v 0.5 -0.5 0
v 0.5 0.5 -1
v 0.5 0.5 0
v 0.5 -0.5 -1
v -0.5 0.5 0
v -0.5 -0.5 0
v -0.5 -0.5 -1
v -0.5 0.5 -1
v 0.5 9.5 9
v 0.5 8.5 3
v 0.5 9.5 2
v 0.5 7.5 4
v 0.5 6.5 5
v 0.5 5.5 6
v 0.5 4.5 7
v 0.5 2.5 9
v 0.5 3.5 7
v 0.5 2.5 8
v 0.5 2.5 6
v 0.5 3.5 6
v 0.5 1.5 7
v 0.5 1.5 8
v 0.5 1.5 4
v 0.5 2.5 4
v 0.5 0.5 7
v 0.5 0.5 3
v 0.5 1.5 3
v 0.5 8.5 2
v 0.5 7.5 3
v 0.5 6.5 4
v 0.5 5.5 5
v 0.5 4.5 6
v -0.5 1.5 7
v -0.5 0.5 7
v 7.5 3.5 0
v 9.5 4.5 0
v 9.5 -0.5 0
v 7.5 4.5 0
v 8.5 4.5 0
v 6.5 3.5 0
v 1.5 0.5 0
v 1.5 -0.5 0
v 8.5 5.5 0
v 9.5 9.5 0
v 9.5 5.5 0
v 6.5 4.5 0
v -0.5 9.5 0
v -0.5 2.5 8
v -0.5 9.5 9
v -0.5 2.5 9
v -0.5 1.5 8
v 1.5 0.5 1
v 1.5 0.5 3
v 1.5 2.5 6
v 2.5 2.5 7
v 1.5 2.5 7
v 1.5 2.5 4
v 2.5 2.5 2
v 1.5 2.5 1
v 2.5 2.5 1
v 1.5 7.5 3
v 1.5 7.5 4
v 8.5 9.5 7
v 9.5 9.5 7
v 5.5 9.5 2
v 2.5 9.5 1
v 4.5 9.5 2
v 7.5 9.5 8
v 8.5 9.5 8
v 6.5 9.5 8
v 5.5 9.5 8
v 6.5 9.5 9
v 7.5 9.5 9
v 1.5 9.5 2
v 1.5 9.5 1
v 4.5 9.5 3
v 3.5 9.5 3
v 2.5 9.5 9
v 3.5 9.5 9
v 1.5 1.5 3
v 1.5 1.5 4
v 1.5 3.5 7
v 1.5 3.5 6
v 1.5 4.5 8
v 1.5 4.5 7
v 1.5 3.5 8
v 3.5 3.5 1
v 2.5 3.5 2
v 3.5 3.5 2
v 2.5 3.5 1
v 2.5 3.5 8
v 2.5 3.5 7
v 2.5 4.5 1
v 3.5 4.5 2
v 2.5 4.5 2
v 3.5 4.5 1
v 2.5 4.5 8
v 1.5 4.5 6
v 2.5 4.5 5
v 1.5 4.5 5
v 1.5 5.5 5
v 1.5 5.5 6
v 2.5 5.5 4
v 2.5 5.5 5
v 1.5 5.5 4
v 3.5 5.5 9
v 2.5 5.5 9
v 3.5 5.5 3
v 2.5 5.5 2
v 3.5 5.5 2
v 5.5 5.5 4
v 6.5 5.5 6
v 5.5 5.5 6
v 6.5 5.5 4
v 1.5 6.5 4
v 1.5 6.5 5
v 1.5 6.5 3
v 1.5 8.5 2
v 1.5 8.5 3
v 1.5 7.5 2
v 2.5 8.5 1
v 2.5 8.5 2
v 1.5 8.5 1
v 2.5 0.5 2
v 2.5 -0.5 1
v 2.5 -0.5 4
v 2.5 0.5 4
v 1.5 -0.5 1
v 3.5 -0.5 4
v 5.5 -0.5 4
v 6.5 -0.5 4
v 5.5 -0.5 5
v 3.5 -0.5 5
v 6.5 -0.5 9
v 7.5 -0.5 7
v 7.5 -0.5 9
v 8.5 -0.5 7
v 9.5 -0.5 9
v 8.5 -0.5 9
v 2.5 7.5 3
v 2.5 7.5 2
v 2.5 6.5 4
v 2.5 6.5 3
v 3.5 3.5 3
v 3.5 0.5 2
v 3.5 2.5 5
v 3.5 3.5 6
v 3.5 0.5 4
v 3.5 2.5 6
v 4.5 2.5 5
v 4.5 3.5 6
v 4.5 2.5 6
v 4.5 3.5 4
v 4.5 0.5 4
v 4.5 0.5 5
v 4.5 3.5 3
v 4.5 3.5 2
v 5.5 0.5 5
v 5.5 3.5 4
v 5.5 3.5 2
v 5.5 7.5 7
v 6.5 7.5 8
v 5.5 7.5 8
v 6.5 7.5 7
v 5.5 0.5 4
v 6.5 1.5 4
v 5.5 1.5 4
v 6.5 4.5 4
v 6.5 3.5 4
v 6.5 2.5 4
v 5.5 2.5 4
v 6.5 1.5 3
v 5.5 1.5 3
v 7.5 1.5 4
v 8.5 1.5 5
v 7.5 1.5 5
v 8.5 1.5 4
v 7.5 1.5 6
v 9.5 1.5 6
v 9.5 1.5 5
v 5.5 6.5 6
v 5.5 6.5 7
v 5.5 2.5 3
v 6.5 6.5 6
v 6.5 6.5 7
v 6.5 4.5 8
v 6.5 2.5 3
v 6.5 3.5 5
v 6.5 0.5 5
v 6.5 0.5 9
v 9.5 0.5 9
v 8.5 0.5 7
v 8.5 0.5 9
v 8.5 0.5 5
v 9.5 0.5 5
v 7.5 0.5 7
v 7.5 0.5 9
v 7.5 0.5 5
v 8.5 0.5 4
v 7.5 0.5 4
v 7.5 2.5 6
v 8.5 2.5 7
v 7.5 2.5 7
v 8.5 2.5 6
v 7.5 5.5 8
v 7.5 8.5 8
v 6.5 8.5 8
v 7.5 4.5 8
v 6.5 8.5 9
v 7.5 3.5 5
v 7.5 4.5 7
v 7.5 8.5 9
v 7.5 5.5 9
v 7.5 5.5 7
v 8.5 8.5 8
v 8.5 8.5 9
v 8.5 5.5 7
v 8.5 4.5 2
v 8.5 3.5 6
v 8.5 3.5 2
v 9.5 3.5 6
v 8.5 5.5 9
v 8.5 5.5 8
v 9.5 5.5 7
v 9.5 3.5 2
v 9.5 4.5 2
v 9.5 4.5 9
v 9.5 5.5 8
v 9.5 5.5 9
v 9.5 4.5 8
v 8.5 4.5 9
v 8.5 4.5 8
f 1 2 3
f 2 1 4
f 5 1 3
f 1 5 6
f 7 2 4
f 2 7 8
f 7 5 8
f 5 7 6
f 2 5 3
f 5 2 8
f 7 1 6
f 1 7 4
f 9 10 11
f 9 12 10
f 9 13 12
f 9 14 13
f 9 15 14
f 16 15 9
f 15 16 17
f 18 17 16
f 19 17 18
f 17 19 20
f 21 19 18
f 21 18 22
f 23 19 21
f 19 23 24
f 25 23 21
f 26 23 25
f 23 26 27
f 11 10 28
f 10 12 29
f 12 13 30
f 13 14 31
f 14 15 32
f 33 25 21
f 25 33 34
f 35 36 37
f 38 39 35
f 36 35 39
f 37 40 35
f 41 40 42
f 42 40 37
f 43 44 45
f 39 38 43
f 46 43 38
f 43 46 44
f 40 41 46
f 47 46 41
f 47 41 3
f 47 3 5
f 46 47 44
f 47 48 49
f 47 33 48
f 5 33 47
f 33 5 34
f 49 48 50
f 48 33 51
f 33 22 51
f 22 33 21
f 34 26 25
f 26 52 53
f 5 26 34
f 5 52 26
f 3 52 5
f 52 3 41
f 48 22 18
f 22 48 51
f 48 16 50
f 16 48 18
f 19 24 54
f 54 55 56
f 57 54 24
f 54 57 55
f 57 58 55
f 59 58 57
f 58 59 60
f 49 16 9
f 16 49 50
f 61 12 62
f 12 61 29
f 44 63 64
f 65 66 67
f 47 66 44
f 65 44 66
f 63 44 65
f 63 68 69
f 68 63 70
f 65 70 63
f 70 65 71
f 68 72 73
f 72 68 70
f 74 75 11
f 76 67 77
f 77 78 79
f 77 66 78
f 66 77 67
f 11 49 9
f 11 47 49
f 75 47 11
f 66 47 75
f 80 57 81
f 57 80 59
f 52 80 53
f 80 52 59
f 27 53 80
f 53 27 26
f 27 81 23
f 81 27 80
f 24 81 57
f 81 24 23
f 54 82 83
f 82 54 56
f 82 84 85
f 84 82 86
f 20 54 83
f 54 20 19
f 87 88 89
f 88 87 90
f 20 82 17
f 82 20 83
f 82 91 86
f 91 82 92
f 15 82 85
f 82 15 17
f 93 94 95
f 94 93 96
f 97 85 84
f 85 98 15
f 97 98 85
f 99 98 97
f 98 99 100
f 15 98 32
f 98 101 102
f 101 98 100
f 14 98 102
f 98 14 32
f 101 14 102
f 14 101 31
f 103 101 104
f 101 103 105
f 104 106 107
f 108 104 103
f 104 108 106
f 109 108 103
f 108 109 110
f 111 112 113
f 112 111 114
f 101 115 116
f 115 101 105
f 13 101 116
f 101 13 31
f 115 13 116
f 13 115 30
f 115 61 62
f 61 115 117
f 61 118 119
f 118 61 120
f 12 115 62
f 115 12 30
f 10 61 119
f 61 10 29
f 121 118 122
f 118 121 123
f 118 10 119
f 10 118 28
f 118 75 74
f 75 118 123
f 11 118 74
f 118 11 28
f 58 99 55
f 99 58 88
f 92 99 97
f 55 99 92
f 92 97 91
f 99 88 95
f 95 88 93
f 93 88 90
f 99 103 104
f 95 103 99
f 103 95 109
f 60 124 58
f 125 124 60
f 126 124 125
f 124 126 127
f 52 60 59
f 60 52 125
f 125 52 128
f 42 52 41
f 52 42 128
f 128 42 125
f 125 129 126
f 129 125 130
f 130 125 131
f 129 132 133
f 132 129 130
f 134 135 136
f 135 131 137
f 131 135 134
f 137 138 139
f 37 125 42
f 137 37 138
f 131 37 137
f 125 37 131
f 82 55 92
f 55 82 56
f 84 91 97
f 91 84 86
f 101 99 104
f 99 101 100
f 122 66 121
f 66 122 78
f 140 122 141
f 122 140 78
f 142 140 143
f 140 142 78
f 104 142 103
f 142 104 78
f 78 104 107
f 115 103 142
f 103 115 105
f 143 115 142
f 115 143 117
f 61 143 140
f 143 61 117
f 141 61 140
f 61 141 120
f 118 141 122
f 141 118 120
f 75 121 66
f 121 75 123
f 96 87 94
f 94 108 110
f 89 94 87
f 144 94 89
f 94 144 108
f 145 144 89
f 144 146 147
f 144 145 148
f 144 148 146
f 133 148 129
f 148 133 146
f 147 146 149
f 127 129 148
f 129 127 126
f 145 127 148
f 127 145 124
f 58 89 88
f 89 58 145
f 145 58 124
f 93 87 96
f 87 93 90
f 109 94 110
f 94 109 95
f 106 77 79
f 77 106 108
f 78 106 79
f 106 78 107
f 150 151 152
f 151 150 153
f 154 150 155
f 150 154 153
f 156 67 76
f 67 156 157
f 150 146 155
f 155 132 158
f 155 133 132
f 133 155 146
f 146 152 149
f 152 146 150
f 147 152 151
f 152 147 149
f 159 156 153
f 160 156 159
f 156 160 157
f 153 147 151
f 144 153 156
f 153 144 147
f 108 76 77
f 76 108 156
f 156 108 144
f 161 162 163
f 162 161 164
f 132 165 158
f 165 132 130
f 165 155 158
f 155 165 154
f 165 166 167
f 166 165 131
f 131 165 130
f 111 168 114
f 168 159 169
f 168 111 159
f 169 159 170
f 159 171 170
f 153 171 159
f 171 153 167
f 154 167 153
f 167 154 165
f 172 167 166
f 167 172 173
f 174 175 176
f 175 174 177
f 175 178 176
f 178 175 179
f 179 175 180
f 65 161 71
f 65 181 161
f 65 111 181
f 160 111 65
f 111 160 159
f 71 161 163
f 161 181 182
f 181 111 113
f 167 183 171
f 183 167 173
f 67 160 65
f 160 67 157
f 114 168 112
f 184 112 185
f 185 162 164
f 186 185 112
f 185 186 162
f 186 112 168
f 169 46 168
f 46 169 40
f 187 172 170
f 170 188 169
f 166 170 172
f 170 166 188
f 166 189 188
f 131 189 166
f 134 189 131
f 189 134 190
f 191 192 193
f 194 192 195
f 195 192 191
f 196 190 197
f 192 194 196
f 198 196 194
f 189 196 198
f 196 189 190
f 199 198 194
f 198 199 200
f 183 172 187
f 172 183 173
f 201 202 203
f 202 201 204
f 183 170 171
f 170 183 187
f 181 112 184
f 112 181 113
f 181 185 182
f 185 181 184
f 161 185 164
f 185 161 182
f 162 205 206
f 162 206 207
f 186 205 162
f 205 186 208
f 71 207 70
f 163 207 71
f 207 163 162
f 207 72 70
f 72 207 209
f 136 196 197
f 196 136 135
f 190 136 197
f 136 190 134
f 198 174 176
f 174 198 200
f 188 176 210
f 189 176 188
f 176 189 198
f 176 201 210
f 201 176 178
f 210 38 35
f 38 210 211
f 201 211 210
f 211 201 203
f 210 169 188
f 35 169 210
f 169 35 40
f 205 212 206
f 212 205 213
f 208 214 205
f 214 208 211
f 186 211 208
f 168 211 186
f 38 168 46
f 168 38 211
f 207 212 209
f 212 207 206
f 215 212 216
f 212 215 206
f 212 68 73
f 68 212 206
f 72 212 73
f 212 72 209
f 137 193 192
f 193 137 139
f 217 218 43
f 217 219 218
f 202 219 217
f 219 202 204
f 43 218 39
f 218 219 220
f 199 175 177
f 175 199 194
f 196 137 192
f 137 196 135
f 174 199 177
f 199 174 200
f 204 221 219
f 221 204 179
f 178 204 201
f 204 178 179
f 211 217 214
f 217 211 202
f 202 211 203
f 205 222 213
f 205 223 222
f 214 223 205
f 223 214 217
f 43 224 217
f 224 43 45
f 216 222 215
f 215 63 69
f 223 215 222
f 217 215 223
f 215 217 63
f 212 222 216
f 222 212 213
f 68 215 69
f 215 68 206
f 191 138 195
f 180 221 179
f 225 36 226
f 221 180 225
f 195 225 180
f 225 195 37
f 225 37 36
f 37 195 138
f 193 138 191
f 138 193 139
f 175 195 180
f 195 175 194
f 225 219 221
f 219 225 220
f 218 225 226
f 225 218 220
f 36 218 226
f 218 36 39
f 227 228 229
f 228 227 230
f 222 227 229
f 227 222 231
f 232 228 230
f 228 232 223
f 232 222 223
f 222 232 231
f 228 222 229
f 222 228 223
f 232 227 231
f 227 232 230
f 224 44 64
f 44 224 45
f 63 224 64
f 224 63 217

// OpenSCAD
union() {
    translate([0, 0, -0.5]) color([1, 0, 0]) cube([1, 1, 1], center=true);
    translate([0, 1, 3.5]) cube([1, 1, 7], center=true);
    translate([0, 2, 4.0]) cube([1, 1, 8], center=true);
    translate([0, 3, 4.5]) cube([1, 1, 9], center=true);
    translate([0, 4, 4.5]) cube([1, 1, 9], center=true);
    translate([0, 5, 4.5]) cube([1, 1, 9], center=true);
    translate([0, 6, 4.5]) cube([1, 1, 9], center=true);
    translate([0, 7, 4.5]) cube([1, 1, 9], center=true);
    translate([0, 8, 4.5]) cube([1, 1, 9], center=true);
    translate([0, 9, 4.5]) cube([1, 1, 9], center=true);
    translate([1, 1, 1.5]) cube([1, 1, 3], center=true);
    translate([1, 2, 2.0]) cube([1, 1, 4], center=true);
    translate([1, 3, 3.0]) cube([1, 1, 6], center=true);
    translate([1, 4, 3.5]) cube([1, 1, 7], center=true);
    translate([1, 5, 3.0]) cube([1, 1, 6], center=true);
    translate([1, 6, 2.5]) cube([1, 1, 5], center=true);
    translate([1, 7, 2.0]) cube([1, 1, 4], center=true);
    translate([1, 8, 1.5]) cube([1, 1, 3], center=true);
    translate([1, 9, 1.0]) cube([1, 1, 2], center=true);
    translate([2, 0, 0.5]) cube([1, 1, 1], center=true);
    translate([2, 1, 0.5]) cube([1, 1, 1], center=true);
    translate([2, 2, 0.5]) cube([1, 1, 1], center=true);
    translate([2, 3, 3.5]) cube([1, 1, 7], center=true);
    translate([2, 4, 4.0]) cube([1, 1, 8], center=true);
    translate([2, 5, 2.5]) cube([1, 1, 5], center=true);
    translate([2, 6, 2.0]) cube([1, 1, 4], center=true);
    translate([2, 7, 1.5]) cube([1, 1, 3], center=true);
    translate([2, 8, 1.0]) cube([1, 1, 2], center=true);
    translate([2, 9, 0.5]) cube([1, 1, 1], center=true);
    translate([3, 0, 2.0]) cube([1, 1, 4], center=true);
    translate([3, 1, 1.0]) cube([1, 1, 2], center=true);
    translate([3, 2, 1.0]) cube([1, 1, 2], center=true);
    translate([3, 3, 1.0]) cube([1, 1, 2], center=true);
    translate([3, 4, 0.5]) cube([1, 1, 1], center=true);
    translate([3, 5, 1.0]) cube([1, 1, 2], center=true);
    translate([3, 6, 4.5]) cube([1, 1, 9], center=true);
    translate([3, 7, 4.5]) cube([1, 1, 9], center=true);
    translate([3, 8, 4.5]) cube([1, 1, 9], center=true);
    translate([3, 9, 4.5]) cube([1, 1, 9], center=true);
    translate([4, 0, 2.5]) cube([1, 1, 5], center=true);
    translate([4, 1, 2.5]) cube([1, 1, 5], center=true);
    translate([4, 2, 2.5]) cube([1, 1, 5], center=true);
    translate([4, 3, 3.0]) cube([1, 1, 6], center=true);
    translate([4, 4, 1.5]) cube([1, 1, 3], center=true);
    translate([4, 5, 1.5]) cube([1, 1, 3], center=true);
    translate([4, 6, 1.5]) cube([1, 1, 3], center=true);
    translate([4, 7, 1.5]) cube([1, 1, 3], center=true);
    translate([4, 8, 1.5]) cube([1, 1, 3], center=true);
    translate([4, 9, 1.5]) cube([1, 1, 3], center=true);
    translate([5, 0, 2.5]) cube([1, 1, 5], center=true);
    translate([5, 1, 2.0]) cube([1, 1, 4], center=true);
    translate([5, 2, 2.0]) cube([1, 1, 4], center=true);
    translate([5, 3, 2.0]) cube([1, 1, 4], center=true);
    translate([5, 4, 1.0]) cube([1, 1, 2], center=true);
    translate([5, 5, 1.0]) cube([1, 1, 2], center=true);
    translate([5, 6, 1.0]) cube([1, 1, 2], center=true);
    translate([5, 7, 1.0]) cube([1, 1, 2], center=true);
    translate([5, 8, 1.0]) cube([1, 1, 2], center=true);
    translate([5, 9, 1.0]) cube([1, 1, 2], center=true);
    translate([6, 0, 2.0]) cube([1, 1, 4], center=true);
    translate([6, 1, 2.0]) cube([1, 1, 4], center=true);
    translate([6, 2, 1.5]) cube([1, 1, 3], center=true);
    translate([6, 3, 2.0]) cube([1, 1, 4], center=true);
    translate([6, 4, 2.0]) cube([1, 1, 4], center=true);
    translate([6, 5, 2.0]) cube([1, 1, 4], center=true);
    translate([6, 6, 3.0]) cube([1, 1, 6], center=true);
    translate([6, 7, 3.5]) cube([1, 1, 7], center=true);
    translate([6, 8, 4.0]) cube([1, 1, 8], center=true);
    translate([6, 9, 4.0]) cube([1, 1, 8], center=true);
    translate([7, 0, 4.5]) cube([1, 1, 9], center=true);
    translate([7, 1, 2.5]) cube([1, 1, 5], center=true);
    translate([7, 2, 2.5]) cube([1, 1, 5], center=true);
    translate([7, 3, 2.5]) cube([1, 1, 5], center=true);
    translate([7, 5, 4.0]) cube([1, 1, 8], center=true);
    translate([7, 6, 4.0]) cube([1, 1, 8], center=true);
    translate([7, 7, 4.0]) cube([1, 1, 8], center=true);
    translate([7, 8, 4.0]) cube([1, 1, 8], center=true);
    translate([7, 9, 4.5]) cube([1, 1, 9], center=true);
    translate([8, 0, 3.5]) cube([1, 1, 7], center=true);
    translate([8, 1, 2.0]) cube([1, 1, 4], center=true);
    translate([8, 2, 3.0]) cube([1, 1, 6], center=true);
    translate([8, 3, 3.5]) cube([1, 1, 7], center=true);
    translate([8, 4, 3.5]) cube([1, 1, 7], center=true);
    translate([8, 5, 3.5]) cube([1, 1, 7], center=true);
    translate([8, 6, 4.5]) cube([1, 1, 9], center=true);
    translate([8, 7, 4.5]) cube([1, 1, 9], center=true);
    translate([8, 8, 4.5]) cube([1, 1, 9], center=true);
    translate([8, 9, 4.0]) cube([1, 1, 8], center=true);
    translate([9, 0, 4.5]) cube([1, 1, 9], center=true);
    translate([9, 1, 2.5]) cube([1, 1, 5], center=true);
    translate([9, 2, 3.0]) cube([1, 1, 6], center=true);
    translate([9, 3, 3.0]) cube([1, 1, 6], center=true);
    translate([9, 4, 1.0]) cube([1, 1, 2], center=true);
    translate([9, 5, 8.5]) color([0, 0, 1]) cube([1, 1, 1], center=true);
    translate([9, 6, 3.5]) cube([1, 1, 7], center=true);
    translate([9, 7, 3.5]) cube([1, 1, 7], center=true);
    translate([9, 8, 3.5]) cube([1, 1, 7], center=true);
    translate([9, 9, 3.5]) cube([1, 1, 7], center=true);
}
